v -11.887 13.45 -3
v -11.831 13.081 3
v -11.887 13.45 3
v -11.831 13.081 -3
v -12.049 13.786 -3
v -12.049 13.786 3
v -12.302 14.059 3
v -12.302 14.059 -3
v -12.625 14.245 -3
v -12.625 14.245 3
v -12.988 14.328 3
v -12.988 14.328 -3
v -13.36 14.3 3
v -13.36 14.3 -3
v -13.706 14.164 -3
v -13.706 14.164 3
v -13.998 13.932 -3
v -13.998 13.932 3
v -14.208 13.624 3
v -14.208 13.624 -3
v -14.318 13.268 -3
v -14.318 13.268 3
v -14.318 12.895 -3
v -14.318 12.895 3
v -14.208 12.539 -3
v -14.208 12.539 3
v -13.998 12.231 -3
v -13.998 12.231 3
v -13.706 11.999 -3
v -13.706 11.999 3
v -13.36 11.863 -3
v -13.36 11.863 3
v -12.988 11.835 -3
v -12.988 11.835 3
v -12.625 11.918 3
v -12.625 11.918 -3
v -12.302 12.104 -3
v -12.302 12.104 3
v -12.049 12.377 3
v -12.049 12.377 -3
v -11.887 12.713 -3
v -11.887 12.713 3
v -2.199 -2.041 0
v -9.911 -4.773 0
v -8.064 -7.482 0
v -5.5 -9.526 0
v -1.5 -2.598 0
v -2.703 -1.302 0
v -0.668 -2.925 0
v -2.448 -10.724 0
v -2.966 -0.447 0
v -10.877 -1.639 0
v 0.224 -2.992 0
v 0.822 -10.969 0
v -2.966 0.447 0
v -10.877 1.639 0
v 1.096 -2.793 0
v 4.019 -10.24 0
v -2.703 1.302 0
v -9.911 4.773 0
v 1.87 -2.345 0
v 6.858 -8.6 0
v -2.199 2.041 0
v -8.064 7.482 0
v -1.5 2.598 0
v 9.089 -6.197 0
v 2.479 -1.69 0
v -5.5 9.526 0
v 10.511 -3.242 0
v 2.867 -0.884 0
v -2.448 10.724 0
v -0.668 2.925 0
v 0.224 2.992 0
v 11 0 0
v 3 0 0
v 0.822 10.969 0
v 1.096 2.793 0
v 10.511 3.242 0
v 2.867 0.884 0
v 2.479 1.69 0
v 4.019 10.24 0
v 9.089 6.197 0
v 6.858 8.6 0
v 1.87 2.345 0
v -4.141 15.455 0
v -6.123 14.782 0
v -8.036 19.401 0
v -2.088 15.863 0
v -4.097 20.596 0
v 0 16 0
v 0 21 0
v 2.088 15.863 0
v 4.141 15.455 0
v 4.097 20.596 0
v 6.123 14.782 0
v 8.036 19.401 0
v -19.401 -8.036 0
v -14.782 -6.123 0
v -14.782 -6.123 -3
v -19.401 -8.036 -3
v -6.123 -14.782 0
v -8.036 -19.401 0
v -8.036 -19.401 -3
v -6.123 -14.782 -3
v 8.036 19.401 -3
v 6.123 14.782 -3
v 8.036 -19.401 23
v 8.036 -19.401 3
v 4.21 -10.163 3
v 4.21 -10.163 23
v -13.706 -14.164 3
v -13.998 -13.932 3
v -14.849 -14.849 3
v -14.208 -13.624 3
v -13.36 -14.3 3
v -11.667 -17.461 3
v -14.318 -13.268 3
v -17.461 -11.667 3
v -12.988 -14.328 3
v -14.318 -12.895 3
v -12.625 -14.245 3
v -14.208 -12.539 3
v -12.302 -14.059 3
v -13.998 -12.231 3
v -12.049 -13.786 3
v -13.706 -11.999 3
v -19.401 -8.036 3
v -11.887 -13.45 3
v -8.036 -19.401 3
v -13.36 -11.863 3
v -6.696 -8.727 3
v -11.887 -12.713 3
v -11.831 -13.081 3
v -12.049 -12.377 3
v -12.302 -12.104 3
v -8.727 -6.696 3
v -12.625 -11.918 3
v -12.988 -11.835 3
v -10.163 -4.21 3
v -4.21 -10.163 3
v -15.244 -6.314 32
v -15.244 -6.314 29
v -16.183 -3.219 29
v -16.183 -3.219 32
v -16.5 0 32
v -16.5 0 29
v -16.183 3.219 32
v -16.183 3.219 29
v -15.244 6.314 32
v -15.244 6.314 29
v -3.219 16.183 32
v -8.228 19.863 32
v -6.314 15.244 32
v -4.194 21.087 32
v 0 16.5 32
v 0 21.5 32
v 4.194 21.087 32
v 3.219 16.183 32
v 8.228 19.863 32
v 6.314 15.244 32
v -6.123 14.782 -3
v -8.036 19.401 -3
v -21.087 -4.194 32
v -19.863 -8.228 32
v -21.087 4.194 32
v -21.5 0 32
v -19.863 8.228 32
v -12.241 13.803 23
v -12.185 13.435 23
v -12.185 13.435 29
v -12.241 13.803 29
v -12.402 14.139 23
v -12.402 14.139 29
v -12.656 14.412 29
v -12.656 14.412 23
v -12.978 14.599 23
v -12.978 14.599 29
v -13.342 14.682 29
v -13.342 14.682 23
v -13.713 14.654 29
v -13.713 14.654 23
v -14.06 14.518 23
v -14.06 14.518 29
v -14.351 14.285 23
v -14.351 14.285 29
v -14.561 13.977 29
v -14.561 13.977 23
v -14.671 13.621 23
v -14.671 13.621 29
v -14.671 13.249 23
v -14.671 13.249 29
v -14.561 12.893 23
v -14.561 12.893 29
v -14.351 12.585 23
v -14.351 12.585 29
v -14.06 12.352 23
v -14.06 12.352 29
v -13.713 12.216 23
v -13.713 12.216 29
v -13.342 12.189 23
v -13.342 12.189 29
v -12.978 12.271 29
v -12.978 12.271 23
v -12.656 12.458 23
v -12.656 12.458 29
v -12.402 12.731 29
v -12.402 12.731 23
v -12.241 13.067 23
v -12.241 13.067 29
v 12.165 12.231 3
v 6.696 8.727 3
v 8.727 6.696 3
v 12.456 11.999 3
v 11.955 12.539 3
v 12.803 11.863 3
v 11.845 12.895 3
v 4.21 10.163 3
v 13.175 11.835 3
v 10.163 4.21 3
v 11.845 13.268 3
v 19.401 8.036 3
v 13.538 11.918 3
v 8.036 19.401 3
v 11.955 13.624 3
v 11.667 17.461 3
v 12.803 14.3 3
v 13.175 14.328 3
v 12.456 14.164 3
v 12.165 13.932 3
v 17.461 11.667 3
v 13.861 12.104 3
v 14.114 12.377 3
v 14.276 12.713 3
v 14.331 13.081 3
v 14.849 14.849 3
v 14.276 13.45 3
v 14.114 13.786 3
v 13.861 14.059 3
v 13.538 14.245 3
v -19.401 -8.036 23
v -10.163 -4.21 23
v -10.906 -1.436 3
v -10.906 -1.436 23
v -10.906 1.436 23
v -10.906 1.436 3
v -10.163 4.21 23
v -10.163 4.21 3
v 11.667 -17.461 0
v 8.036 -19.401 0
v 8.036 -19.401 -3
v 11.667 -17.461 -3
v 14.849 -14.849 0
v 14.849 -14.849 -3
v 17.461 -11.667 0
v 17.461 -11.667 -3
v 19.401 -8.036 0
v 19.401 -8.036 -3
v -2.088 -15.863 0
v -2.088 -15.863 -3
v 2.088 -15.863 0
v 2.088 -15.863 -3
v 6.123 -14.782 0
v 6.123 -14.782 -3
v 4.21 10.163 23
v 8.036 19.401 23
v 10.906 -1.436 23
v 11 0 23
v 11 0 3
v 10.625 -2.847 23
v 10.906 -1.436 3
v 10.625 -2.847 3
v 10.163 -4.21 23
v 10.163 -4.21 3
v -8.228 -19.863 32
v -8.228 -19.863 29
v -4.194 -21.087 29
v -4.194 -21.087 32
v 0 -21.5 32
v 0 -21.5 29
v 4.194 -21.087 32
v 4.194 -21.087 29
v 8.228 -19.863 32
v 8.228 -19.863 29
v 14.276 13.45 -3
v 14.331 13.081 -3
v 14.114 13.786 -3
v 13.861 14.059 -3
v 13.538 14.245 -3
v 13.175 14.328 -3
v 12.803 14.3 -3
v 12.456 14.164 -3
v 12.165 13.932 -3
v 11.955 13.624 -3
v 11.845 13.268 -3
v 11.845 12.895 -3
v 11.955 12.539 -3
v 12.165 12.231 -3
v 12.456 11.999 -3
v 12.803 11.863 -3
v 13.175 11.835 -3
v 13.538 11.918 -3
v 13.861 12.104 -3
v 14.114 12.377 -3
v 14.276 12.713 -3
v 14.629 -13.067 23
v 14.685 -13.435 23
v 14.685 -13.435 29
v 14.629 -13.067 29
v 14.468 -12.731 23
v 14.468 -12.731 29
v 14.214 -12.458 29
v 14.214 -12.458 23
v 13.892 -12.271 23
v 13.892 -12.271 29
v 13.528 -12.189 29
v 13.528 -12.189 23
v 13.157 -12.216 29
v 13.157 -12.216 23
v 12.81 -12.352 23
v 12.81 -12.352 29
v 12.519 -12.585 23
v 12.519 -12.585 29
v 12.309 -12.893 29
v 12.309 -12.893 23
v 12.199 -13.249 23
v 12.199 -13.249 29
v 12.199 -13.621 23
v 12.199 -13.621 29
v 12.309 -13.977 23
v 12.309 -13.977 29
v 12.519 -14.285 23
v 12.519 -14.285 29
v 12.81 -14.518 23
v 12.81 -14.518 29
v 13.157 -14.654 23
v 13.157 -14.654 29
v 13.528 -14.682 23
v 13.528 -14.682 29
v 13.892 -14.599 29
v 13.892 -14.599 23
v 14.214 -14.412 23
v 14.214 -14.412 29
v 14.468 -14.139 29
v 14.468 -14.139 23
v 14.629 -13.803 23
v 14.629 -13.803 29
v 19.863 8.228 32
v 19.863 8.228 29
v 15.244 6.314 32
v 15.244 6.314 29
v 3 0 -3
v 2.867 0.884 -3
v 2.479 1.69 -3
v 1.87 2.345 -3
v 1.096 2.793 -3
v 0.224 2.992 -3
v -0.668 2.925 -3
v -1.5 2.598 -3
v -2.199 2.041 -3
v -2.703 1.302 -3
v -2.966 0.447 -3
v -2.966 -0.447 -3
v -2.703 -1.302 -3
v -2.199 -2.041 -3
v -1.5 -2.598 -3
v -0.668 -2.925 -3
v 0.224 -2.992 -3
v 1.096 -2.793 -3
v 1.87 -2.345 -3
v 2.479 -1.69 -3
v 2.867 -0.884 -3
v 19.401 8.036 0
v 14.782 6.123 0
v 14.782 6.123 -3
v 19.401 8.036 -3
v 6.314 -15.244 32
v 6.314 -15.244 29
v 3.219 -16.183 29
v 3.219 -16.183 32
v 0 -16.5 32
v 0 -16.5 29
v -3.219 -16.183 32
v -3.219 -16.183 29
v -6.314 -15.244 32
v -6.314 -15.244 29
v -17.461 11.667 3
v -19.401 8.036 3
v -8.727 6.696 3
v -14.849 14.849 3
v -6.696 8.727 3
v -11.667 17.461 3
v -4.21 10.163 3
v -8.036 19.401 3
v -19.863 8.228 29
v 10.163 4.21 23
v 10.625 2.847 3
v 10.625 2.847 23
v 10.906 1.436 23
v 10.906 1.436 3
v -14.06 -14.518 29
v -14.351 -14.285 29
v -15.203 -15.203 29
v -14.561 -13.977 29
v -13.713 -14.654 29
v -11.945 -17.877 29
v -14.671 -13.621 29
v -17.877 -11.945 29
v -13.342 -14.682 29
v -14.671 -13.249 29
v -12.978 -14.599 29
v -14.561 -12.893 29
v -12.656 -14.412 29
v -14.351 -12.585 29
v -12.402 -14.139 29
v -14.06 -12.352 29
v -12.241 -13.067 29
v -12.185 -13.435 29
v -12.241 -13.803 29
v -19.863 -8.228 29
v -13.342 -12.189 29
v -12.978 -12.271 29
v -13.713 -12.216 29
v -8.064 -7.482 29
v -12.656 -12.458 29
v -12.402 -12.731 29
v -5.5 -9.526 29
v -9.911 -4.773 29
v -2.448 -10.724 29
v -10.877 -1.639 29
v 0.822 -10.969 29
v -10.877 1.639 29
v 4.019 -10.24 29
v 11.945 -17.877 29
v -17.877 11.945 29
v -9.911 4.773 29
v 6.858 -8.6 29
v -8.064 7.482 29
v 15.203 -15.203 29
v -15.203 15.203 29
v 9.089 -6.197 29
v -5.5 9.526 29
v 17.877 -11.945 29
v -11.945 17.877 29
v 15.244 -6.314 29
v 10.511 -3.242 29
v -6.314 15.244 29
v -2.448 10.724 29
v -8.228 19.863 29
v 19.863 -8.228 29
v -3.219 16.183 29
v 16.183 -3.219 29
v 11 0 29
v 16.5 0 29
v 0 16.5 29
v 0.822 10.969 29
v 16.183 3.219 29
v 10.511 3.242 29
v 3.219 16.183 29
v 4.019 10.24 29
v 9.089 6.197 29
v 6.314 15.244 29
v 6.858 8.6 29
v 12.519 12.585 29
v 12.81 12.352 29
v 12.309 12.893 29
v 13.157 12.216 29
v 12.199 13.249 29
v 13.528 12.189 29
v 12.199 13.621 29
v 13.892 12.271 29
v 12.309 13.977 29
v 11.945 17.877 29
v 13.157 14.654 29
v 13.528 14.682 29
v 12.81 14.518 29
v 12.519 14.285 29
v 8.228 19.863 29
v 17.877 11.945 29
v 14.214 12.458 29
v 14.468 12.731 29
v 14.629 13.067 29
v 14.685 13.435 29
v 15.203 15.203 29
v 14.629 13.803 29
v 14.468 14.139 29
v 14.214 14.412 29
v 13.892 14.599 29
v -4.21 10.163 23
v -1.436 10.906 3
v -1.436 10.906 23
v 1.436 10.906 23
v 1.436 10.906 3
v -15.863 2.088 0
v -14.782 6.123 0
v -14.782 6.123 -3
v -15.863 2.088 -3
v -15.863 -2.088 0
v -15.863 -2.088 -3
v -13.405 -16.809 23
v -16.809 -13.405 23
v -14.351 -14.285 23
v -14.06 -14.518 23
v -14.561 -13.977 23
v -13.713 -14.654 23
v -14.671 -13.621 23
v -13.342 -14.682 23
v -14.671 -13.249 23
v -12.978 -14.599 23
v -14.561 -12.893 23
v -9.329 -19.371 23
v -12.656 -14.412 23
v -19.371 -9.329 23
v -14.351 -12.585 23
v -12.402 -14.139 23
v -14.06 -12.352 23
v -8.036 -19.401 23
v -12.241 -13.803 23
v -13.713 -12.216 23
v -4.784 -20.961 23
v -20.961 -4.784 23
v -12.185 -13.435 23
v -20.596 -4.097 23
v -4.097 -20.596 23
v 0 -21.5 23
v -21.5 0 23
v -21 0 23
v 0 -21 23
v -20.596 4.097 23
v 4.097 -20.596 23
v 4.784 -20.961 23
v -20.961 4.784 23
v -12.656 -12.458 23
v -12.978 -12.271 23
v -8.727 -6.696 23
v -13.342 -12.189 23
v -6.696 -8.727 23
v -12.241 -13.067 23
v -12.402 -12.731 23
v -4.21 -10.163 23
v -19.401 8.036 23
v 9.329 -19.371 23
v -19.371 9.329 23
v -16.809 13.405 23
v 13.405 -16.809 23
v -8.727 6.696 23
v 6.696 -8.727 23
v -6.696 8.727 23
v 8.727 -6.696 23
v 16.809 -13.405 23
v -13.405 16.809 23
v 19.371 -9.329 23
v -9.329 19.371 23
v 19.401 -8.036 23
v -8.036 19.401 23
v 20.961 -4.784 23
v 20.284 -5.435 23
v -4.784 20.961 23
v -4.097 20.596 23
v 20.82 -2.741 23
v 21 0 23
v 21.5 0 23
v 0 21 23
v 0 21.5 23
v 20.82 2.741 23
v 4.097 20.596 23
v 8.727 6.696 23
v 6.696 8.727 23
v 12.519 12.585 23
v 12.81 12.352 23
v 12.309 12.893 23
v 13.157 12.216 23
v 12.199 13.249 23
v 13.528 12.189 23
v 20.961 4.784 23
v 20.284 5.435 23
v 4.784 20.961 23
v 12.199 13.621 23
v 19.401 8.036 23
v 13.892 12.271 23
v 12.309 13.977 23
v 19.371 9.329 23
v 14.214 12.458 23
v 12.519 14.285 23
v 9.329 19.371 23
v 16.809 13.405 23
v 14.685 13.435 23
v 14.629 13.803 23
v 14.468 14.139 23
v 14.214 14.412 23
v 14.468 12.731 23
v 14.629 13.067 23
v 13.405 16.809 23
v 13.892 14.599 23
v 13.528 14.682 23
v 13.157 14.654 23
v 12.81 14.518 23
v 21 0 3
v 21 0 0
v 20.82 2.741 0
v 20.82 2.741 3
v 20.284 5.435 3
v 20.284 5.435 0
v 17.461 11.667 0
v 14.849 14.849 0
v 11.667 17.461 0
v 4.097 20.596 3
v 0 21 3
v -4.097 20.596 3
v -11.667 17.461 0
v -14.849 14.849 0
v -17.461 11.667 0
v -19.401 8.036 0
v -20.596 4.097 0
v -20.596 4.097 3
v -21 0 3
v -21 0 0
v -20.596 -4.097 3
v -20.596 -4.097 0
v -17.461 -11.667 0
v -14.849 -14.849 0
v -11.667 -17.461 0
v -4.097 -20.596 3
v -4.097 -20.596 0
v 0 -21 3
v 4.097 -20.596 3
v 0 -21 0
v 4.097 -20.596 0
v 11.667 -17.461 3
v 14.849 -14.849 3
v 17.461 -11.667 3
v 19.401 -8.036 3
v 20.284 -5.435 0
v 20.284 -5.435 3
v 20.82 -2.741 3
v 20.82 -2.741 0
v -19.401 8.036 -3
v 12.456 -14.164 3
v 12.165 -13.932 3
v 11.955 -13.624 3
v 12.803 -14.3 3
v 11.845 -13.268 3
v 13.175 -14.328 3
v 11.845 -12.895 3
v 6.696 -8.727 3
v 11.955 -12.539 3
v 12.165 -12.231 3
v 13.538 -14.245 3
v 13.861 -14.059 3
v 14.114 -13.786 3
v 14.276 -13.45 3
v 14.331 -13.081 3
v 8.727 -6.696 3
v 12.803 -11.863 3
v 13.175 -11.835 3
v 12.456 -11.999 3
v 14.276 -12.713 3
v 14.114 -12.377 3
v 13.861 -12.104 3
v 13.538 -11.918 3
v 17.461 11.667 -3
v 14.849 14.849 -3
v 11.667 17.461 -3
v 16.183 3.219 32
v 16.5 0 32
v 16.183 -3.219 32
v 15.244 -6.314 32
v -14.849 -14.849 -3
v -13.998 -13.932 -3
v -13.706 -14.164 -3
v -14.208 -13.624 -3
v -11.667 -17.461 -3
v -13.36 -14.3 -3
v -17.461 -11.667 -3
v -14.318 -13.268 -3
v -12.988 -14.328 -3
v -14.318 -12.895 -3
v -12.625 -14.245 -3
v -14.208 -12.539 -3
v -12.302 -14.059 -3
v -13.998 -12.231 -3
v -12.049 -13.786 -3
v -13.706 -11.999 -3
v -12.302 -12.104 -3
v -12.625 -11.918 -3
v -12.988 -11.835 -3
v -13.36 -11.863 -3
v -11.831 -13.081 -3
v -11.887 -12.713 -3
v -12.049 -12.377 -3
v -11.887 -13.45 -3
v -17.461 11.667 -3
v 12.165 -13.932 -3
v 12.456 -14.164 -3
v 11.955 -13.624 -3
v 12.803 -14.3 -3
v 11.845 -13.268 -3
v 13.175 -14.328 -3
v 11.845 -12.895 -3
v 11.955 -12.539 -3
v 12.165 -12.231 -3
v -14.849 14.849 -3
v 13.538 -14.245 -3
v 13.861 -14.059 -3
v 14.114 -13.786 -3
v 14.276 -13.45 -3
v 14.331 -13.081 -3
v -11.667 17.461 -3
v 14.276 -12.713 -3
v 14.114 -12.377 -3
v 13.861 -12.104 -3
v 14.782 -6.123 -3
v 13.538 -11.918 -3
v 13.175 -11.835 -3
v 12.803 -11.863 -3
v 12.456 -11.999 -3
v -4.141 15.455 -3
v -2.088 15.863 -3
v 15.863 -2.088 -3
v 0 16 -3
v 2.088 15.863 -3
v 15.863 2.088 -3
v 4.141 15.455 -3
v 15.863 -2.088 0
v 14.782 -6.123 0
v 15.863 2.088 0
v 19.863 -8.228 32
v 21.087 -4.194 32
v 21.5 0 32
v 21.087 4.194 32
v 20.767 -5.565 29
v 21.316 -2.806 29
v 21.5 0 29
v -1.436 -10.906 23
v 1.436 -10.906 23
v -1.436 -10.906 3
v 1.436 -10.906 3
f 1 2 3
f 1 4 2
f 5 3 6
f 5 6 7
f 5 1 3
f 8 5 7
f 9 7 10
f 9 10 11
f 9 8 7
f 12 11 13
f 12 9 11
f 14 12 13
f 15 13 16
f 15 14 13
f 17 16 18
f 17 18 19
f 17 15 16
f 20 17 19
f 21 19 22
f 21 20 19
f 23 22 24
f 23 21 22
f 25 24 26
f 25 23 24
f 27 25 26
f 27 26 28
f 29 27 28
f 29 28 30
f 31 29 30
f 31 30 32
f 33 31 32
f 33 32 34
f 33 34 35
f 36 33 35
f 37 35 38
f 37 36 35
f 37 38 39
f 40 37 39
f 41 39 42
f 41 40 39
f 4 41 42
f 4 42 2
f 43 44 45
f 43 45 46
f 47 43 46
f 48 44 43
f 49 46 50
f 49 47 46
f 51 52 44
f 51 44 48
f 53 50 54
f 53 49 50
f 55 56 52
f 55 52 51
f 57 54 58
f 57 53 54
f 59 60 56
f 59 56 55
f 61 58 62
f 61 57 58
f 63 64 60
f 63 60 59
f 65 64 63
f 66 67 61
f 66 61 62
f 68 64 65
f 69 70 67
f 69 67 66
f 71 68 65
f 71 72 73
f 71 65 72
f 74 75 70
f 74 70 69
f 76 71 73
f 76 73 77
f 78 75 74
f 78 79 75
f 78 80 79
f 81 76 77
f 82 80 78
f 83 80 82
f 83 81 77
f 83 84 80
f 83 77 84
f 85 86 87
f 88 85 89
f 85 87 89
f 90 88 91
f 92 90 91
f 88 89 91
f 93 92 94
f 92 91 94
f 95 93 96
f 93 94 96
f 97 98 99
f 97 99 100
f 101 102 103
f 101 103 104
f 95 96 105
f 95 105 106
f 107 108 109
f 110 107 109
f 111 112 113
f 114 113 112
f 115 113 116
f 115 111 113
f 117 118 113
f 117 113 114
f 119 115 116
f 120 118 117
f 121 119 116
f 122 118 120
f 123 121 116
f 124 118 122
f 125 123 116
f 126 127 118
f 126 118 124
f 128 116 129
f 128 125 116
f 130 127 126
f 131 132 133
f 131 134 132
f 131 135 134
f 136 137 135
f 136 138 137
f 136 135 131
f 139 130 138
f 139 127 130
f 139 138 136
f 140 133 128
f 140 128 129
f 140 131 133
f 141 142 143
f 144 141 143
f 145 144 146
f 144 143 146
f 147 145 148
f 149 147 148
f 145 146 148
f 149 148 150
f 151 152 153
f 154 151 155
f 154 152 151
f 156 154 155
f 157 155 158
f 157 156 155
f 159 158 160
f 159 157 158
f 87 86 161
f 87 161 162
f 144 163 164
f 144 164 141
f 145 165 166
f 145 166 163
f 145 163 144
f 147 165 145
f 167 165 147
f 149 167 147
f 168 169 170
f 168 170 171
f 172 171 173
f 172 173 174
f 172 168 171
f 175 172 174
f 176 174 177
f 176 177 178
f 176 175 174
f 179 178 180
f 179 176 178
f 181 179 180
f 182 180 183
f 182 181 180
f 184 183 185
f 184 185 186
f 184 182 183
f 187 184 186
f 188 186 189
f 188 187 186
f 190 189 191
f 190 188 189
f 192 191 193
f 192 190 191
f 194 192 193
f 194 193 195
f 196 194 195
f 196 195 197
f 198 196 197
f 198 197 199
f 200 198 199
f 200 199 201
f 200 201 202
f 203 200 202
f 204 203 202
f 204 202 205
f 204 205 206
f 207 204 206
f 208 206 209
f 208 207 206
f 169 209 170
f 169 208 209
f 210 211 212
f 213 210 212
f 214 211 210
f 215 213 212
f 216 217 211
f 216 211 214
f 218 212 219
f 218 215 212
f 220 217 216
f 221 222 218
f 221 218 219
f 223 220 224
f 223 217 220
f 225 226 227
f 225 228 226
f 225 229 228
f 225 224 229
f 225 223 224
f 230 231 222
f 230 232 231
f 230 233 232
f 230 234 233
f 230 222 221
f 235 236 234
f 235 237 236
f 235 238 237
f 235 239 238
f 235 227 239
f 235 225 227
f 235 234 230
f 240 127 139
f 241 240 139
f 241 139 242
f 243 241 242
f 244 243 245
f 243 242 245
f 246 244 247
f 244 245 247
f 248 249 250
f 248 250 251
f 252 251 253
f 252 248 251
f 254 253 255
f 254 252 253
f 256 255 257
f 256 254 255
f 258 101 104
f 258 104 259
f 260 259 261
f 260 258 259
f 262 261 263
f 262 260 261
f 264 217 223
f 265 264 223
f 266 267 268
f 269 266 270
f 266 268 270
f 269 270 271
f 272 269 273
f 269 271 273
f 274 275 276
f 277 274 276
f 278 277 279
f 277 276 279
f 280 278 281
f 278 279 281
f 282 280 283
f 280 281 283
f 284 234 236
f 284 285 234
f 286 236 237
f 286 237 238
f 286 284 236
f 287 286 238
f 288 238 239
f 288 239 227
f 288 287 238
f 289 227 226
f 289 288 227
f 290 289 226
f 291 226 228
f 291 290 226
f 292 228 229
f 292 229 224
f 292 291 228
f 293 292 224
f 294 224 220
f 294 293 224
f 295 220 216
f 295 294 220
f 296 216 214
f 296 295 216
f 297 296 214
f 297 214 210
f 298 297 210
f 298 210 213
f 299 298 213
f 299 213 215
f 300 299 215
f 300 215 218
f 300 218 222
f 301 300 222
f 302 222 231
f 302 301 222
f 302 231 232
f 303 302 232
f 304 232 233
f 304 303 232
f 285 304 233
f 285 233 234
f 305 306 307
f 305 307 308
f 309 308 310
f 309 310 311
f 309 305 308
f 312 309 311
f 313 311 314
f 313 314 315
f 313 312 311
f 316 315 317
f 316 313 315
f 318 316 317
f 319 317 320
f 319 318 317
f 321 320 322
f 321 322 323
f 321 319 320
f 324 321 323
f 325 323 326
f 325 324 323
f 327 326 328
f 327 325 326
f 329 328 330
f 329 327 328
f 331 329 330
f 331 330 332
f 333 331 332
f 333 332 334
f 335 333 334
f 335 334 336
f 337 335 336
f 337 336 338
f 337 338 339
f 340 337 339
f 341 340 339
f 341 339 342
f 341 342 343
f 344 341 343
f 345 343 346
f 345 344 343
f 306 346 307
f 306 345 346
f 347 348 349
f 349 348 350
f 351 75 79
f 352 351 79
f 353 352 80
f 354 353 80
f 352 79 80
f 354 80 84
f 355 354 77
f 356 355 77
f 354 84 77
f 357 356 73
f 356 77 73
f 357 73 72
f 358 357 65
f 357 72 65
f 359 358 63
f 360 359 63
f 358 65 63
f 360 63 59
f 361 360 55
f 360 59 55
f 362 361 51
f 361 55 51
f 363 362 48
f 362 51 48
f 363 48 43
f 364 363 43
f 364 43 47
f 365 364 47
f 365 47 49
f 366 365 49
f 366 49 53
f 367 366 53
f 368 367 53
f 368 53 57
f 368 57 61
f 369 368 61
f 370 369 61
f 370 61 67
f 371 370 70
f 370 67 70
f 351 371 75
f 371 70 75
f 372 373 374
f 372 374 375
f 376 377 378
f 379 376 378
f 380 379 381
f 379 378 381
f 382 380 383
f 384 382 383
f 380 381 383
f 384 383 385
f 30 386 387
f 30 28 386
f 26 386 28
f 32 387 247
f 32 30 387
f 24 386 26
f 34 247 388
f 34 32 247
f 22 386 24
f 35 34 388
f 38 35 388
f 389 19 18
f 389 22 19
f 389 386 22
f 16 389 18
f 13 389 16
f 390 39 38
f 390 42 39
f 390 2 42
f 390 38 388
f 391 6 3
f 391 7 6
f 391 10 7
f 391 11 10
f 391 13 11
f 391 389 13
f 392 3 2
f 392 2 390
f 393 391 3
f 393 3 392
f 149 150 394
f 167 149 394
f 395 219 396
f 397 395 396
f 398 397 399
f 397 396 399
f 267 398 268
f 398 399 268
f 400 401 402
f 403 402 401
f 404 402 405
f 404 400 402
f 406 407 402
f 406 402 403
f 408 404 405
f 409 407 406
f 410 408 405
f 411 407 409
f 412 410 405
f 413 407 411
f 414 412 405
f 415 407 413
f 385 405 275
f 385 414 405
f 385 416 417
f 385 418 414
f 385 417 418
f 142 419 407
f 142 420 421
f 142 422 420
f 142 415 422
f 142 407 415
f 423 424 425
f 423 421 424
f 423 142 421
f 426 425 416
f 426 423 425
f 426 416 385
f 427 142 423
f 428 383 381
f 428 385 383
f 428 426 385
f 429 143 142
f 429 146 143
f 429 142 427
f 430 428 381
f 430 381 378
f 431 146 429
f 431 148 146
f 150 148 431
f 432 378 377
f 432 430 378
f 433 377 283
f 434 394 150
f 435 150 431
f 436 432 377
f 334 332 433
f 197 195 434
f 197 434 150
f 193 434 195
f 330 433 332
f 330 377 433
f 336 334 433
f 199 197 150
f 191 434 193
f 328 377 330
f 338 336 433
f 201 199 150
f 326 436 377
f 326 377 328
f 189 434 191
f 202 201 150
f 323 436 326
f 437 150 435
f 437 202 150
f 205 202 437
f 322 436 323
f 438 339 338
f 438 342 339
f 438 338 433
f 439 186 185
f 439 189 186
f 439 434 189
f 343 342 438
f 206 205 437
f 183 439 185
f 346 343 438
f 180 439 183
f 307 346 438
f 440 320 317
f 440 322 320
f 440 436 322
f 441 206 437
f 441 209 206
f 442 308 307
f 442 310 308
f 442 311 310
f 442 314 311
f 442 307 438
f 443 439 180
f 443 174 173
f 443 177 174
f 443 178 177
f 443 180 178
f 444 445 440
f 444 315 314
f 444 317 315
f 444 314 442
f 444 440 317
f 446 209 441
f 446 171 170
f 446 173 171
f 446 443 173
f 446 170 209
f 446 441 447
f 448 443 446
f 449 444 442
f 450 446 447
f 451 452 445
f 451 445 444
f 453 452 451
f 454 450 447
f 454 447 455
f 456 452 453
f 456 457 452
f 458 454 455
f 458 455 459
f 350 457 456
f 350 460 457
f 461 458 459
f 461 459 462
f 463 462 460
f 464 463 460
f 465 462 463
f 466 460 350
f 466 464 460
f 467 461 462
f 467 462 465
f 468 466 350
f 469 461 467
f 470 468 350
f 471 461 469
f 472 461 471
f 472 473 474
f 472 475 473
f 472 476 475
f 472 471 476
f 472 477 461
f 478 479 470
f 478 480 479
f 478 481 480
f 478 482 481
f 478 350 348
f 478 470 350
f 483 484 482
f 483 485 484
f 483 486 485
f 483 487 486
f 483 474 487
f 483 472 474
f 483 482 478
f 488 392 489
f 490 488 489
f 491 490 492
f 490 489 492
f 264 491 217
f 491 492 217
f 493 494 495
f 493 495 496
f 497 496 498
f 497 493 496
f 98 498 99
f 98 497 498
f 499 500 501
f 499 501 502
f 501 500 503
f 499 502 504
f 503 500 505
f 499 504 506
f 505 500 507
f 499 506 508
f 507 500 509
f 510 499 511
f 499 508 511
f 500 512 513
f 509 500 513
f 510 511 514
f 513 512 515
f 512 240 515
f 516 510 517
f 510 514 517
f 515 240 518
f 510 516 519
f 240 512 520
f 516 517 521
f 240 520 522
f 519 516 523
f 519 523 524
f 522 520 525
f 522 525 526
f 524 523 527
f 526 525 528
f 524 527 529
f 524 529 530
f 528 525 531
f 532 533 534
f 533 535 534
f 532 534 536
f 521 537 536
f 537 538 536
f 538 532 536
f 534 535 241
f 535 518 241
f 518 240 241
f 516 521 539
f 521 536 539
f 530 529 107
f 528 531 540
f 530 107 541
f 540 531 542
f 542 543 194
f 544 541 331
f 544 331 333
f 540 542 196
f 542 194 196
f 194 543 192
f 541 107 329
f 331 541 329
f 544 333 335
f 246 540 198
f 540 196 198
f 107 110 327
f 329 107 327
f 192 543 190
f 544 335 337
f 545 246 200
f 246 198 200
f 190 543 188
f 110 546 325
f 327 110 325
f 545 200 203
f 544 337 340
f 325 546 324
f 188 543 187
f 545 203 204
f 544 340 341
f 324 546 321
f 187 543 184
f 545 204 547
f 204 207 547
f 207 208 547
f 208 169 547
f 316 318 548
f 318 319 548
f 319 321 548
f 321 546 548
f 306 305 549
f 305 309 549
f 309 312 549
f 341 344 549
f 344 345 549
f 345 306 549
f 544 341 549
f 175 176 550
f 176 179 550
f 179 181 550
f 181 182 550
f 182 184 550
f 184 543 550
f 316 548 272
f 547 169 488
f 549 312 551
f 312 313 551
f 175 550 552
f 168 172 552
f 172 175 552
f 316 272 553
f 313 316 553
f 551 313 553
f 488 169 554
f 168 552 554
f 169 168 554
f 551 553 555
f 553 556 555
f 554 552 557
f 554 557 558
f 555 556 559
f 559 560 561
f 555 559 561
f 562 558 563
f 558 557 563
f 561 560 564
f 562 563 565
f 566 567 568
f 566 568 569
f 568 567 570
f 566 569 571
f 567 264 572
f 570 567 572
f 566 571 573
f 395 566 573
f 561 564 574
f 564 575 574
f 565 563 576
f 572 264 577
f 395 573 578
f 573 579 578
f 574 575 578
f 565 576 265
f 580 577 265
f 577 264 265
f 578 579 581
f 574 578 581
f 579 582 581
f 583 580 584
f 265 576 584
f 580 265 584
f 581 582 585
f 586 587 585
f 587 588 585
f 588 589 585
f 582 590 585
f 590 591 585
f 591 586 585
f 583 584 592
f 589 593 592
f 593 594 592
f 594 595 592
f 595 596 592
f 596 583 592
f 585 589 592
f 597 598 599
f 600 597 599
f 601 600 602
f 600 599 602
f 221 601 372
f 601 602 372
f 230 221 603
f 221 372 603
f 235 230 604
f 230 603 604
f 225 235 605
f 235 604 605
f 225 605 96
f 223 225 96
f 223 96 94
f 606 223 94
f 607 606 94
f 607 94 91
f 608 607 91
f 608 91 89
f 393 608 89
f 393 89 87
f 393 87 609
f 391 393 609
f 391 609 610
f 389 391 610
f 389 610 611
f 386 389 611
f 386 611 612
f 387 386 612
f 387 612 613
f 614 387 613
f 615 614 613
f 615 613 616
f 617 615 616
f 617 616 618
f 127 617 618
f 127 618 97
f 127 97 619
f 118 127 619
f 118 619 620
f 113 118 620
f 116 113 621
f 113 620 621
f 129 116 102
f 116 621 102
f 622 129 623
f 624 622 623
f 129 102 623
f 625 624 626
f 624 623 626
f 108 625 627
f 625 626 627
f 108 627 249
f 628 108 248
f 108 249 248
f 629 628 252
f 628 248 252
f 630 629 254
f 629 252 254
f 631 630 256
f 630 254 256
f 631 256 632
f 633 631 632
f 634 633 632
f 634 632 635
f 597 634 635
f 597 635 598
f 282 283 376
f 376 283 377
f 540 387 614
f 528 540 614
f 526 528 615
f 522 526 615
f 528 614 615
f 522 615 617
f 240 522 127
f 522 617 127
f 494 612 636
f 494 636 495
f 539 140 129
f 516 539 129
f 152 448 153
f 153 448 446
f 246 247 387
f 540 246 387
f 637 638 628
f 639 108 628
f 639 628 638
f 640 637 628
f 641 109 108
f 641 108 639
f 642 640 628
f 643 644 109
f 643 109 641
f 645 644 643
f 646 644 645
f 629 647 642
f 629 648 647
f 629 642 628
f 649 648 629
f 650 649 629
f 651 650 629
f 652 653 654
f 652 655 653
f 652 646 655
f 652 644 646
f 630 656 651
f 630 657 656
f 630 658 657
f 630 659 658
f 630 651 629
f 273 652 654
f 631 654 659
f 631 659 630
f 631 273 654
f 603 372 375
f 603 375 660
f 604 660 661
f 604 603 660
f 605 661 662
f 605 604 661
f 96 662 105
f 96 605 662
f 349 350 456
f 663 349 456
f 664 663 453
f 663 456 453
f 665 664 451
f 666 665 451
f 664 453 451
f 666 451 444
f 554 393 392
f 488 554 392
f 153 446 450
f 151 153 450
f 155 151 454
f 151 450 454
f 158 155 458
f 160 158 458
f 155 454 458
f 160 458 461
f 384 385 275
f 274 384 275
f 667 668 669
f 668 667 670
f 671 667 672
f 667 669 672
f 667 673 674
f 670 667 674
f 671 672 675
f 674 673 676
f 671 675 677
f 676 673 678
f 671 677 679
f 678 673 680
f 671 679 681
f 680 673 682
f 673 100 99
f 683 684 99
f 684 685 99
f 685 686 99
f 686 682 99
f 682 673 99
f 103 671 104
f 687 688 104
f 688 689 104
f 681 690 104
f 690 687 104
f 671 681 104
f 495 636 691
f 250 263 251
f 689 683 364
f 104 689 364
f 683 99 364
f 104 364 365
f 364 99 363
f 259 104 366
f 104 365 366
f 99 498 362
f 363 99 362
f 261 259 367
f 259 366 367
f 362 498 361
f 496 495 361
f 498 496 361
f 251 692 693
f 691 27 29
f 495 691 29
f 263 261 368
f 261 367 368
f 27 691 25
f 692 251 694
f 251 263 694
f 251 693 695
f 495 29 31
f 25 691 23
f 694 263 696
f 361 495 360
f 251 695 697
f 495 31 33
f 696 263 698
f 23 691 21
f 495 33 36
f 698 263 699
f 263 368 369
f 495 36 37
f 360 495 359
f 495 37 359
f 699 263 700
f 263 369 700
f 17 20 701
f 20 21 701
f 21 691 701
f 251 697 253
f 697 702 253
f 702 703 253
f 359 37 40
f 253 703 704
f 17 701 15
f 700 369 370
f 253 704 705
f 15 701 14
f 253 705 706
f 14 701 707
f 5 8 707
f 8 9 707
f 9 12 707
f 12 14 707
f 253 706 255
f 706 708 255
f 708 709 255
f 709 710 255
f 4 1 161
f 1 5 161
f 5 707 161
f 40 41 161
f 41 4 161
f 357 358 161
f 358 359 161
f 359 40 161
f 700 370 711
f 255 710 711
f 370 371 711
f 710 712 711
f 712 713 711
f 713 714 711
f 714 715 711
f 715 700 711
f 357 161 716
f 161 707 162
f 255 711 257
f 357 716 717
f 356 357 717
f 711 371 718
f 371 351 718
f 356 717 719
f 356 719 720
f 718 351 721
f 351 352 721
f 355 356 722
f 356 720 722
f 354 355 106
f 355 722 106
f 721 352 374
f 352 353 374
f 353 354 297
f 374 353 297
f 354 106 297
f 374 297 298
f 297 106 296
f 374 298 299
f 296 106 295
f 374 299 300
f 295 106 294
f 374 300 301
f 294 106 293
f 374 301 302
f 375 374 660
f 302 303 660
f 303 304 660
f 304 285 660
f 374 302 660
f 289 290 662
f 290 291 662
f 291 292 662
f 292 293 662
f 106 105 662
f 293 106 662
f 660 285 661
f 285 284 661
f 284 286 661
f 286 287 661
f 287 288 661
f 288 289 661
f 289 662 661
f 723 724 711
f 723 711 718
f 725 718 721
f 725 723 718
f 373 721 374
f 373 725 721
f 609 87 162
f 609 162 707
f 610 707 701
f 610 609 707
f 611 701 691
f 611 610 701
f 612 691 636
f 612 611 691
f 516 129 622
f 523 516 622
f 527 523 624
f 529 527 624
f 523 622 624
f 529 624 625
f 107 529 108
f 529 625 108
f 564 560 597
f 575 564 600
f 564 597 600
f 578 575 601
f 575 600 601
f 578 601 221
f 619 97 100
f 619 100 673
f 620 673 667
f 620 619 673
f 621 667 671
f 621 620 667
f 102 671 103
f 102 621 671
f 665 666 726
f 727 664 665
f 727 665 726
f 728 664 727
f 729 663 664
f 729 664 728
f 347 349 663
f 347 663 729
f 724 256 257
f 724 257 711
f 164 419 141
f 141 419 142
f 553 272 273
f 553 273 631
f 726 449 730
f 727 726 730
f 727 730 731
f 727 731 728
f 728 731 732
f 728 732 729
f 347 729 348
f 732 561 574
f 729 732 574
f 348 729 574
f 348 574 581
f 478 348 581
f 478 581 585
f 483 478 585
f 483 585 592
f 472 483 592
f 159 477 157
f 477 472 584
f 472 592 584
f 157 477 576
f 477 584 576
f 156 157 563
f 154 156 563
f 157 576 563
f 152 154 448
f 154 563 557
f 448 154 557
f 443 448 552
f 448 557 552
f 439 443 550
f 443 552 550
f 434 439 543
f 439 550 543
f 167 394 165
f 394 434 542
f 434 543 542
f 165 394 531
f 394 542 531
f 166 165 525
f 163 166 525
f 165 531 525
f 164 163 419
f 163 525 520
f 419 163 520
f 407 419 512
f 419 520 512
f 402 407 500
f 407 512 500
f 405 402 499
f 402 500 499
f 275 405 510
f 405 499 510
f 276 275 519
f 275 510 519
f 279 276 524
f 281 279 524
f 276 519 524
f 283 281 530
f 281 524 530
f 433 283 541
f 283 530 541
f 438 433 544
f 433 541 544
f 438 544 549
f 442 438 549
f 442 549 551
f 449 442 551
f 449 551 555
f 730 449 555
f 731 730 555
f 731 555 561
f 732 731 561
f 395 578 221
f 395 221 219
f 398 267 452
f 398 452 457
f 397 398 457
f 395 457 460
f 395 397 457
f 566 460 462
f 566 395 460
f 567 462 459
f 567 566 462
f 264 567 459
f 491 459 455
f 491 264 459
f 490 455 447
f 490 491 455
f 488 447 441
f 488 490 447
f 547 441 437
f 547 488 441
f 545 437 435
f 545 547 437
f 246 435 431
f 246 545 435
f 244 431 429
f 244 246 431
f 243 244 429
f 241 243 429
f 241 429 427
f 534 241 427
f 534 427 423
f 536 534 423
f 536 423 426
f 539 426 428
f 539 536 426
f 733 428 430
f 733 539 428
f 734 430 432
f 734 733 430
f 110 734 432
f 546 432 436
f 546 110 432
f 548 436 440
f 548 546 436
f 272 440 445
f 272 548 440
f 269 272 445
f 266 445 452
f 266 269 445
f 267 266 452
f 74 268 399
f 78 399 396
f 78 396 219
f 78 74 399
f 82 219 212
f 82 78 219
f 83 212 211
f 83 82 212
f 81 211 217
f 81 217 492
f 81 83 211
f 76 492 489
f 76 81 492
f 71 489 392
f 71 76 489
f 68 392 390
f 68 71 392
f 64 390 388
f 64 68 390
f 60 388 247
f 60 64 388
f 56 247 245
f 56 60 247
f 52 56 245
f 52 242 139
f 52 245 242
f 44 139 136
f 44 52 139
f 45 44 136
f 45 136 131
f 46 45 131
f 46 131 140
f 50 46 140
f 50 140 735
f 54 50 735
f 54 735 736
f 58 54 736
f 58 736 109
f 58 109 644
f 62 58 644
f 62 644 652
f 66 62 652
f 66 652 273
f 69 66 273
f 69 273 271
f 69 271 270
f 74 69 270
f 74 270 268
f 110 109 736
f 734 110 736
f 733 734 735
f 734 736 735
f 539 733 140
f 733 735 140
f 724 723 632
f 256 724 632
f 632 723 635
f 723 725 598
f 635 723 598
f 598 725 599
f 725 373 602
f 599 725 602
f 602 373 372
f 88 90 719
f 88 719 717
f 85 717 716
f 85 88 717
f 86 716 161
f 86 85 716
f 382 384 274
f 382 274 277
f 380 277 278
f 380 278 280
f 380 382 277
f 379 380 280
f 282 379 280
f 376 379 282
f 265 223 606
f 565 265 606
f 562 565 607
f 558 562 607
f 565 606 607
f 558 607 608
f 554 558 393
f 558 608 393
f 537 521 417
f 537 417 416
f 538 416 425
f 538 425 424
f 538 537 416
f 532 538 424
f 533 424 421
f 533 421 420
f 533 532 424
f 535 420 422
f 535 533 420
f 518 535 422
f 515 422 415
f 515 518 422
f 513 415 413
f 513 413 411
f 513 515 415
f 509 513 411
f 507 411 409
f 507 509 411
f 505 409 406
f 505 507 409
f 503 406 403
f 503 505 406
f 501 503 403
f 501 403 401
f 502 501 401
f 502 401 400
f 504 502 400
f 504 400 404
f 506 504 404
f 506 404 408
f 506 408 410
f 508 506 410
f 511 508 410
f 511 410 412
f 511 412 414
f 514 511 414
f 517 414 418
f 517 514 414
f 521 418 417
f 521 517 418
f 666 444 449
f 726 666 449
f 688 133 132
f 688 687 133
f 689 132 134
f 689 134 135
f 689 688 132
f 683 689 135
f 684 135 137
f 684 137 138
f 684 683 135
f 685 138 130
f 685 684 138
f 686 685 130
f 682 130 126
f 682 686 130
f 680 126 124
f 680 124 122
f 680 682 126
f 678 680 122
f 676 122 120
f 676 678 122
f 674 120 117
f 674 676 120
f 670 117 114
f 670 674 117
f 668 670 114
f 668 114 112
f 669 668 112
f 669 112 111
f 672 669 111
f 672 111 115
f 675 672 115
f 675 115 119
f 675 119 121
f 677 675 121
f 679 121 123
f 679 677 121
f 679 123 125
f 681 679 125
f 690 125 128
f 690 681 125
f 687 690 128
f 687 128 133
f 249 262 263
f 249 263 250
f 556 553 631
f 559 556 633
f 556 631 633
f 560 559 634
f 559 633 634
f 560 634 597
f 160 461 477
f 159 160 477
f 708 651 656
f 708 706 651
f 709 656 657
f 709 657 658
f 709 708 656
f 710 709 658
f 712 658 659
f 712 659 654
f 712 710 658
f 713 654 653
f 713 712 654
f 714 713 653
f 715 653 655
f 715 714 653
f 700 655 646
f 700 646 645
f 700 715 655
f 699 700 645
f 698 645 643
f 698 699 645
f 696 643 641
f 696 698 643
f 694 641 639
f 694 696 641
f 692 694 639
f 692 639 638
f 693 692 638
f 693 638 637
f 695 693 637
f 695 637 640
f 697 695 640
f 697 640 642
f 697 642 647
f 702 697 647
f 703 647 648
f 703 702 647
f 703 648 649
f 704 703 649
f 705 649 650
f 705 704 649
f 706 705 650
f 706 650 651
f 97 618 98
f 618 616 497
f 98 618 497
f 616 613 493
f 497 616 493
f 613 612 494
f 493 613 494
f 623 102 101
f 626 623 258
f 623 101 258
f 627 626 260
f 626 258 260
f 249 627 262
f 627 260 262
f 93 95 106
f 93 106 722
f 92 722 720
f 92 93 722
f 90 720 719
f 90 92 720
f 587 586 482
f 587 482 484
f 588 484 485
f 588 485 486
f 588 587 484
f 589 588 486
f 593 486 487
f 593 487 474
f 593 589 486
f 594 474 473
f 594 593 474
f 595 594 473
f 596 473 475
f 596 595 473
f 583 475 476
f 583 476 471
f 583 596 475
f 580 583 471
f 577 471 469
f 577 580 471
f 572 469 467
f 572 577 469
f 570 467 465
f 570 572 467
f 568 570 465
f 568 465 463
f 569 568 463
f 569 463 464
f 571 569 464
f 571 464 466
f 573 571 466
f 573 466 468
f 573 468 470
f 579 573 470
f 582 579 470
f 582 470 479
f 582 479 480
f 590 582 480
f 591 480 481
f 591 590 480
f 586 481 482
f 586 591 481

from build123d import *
from build123d.topology import SkipClean

# Parameters (mm, degrees)
SKETCH1_R           = 21
SKETCH1_R_2         = 1.25
SKETCH1_R_3         = 11
BOSS_EXTRUDE1_DEPTH = 3
BOSS_EXTRUDE2_START = -3
SKETCH1_3_R         = 3
SKETCH1_3_R_2       = 1.25
BOSS_EXTRUDE2_DEPTH = 3
BOSS_EXTRUDE3_DEPTH = 20
SKETCH5_R           = 21.5
SKETCH5_R_2         = 11
SKETCH5_R_3         = 1.25
BOSS_EXTRUDE4_DEPTH = 6
BOSS_EXTRUDE5_DEPTH = 3


with BuildPart() as part:
    # Sketch1 → Boss-Extrude1 (new body)
    with BuildSketch(Plane.XY):
        Circle(SKETCH1_R)
        with Locations((-13.081475452, -13.081475452)):
            Circle(SKETCH1_R_2, mode=Mode.SUBTRACT)
        with Locations((13.081475452, -13.081475452)):
            Circle(SKETCH1_R_2, mode=Mode.SUBTRACT)
        with Locations((-13.081475452, 13.081475452)):
            Circle(SKETCH1_R_2, mode=Mode.SUBTRACT)
        Circle(SKETCH1_R_3, mode=Mode.SUBTRACT)
        with Locations((13.081475452, 13.081475452)):
            Circle(SKETCH1_R_2, mode=Mode.SUBTRACT)
    extrude(amount=BOSS_EXTRUDE1_DEPTH)

    # Sketch1<3> → Boss-Extrude2 (add)
    with BuildSketch(Plane.XY.offset(BOSS_EXTRUDE2_START)):
        with BuildLine():
            ThreePointArc((0, 16), (-3.121445152, 15.692564486), (-6.122934918, 14.78207252))
            Line((-6.122934918, 14.78207252), (-8.03635208, 19.401470183))
            ThreePointArc((-8.03635208, 19.401470183), (-14.849242405, 14.849242405), (-19.401470183, 8.03635208))
            Line((-19.401470183, 8.03635208), (-14.78207252, 6.122934918))
            ThreePointArc((-14.78207252, 6.122934918), (-16, 0), (-14.78207252, -6.122934918))
            Line((-14.78207252, -6.122934918), (-19.401470183, -8.03635208))
            ThreePointArc((-19.401470183, -8.03635208), (-14.849242405, -14.849242405), (-8.03635208, -19.401470183))
            Line((-8.03635208, -19.401470183), (-6.122934918, -14.78207252))
            ThreePointArc((-6.122934918, -14.78207252), (0, -16), (6.122934918, -14.78207252))
            Line((6.122934918, -14.78207252), (8.03635208, -19.401470183))
            ThreePointArc((8.03635208, -19.401470183), (14.849242405, -14.849242405), (19.401470183, -8.03635208))
            Line((19.401470183, -8.03635208), (14.78207252, -6.122934918))
            ThreePointArc((14.78207252, -6.122934918), (16, 0), (14.78207252, 6.122934918))
            Line((14.78207252, 6.122934918), (19.401470183, 8.03635208))
            ThreePointArc((19.401470183, 8.03635208), (14.849242405, 14.849242405), (8.03635208, 19.401470183))
            Line((8.03635208, 19.401470183), (6.122934918, 14.78207252))
            ThreePointArc((6.122934918, 14.78207252), (3.121445152, 15.692564486), (0, 16))
        make_face()
        Circle(SKETCH1_3_R, mode=Mode.SUBTRACT)
        with Locations((-13.081475452, -13.081475452)):
            Circle(SKETCH1_3_R_2, mode=Mode.SUBTRACT)
        with Locations((13.081475452, -13.081475452)):
            Circle(SKETCH1_3_R_2, mode=Mode.SUBTRACT)
        with Locations((-13.081475452, 13.081475452)):
            Circle(SKETCH1_3_R_2, mode=Mode.SUBTRACT)
        with Locations((13.081475452, 13.081475452)):
            Circle(SKETCH1_3_R_2, mode=Mode.SUBTRACT)
    extrude(amount=BOSS_EXTRUDE2_DEPTH)

    # Sketch2 → Boss-Extrude3 (add)
    with SkipClean():  # the faces are left unmerged after this step: merging them gives an invalid solid
        with BuildSketch(Plane.XY.offset(3)):
            with BuildLine():
                Line((-10.162674858, 4.209517756), (-19.401470183, 8.03635208))
                ThreePointArc((-19.401470183, 8.03635208), (-21, 0), (-19.401470183, -8.03635208))
                Line((-19.401470183, -8.03635208), (-10.162674858, -4.209517756))
                ThreePointArc((-10.162674858, -4.209517756), (-11, 0), (-10.162674858, 4.209517756))
            make_face()
            with BuildLine():
                ThreePointArc((8.03635208, 19.401470183), (0, 21), (-8.03635208, 19.401470183))
                Line((-8.03635208, 19.401470183), (-4.209517756, 10.162674858))
                ThreePointArc((-4.209517756, 10.162674858), (0, 11), (4.209517756, 10.162674858))
                Line((4.209517756, 10.162674858), (8.03635208, 19.401470183))
            make_face()
            with BuildLine():
                Line((-4.209517756, -10.162674858), (-8.03635208, -19.401470183))
                ThreePointArc((-8.03635208, -19.401470183), (0, -21), (8.03635208, -19.401470183))
                Line((8.03635208, -19.401470183), (4.209517756, -10.162674858))
                ThreePointArc((4.209517756, -10.162674858), (0, -11), (-4.209517756, -10.162674858))
            make_face()
            with BuildLine():
                ThreePointArc((19.401470183, -8.03635208), (21, 0), (19.401470183, 8.03635208))
                Line((19.401470183, 8.03635208), (10.162674858, 4.209517756))
                ThreePointArc((10.162674858, 4.209517756), (11, 0), (10.162674858, -4.209517756))
                Line((10.162674858, -4.209517756), (19.401470183, -8.03635208))
            make_face()
        extrude(amount=BOSS_EXTRUDE3_DEPTH)

    # Sketch5 → Boss-Extrude4 (add)
    with SkipClean():  # the faces are left unmerged after this step: merging them gives an invalid solid
        with BuildSketch(Plane.XY.offset(23)):
            Circle(SKETCH5_R)
            Circle(SKETCH5_R_2, mode=Mode.SUBTRACT)
            with Locations((-13.435028843, 13.435028843)):
                Circle(SKETCH5_R_3, mode=Mode.SUBTRACT)
            with Locations((13.435028843, 13.435028843)):
                Circle(SKETCH5_R_3, mode=Mode.SUBTRACT)
            with Locations((13.435028843, -13.435028843)):
                Circle(SKETCH5_R_3, mode=Mode.SUBTRACT)
            with Locations((-13.435028843, -13.435028843)):
                Circle(SKETCH5_R_3, mode=Mode.SUBTRACT)
        extrude(amount=BOSS_EXTRUDE4_DEPTH)

    # Sketch6 → Boss-Extrude5 (add)
    with SkipClean():  # the faces are left unmerged after this step: merging them gives an invalid solid
        with BuildSketch(Plane.XY.offset(29)):
            with BuildLine():
                ThreePointArc((-15.244012286, -6.314276634), (-16.5, 0), (-15.244012286, 6.314276634))
                Line((-15.244012286, 6.314276634), (-19.863409949, 8.227693796))
                ThreePointArc((-19.863409949, 8.227693796), (-21.5, 0), (-19.863409949, -8.227693796))
                Line((-19.863409949, -8.227693796), (-15.244012286, -6.314276634))
            make_face()
            with BuildLine():
                Line((-8.227693796, 19.863409949), (-6.314276634, 15.244012286))
                ThreePointArc((-6.314276634, 15.244012286), (0, 16.5), (6.314276634, 15.244012286))
                Line((6.314276634, 15.244012286), (8.227693796, 19.863409949))
                ThreePointArc((8.227693796, 19.863409949), (0, 21.5), (-8.227693796, 19.863409949))
            make_face()
            with BuildLine():
                ThreePointArc((6.314276634, -15.244012286), (0, -16.5), (-6.314276634, -15.244012286))
                Line((-6.314276634, -15.244012286), (-8.227693796, -19.863409949))
                ThreePointArc((-8.227693796, -19.863409949), (0, -21.5), (8.227693796, -19.863409949))
                Line((8.227693796, -19.863409949), (6.314276634, -15.244012286))
            make_face()
            with BuildLine():
                Line((19.863409949, 8.227693796), (15.244012286, 6.314276634))
                ThreePointArc((15.244012286, 6.314276634), (16.5, 0), (15.244012286, -6.314276634))
                Line((15.244012286, -6.314276634), (19.863409949, -8.227693796))
                ThreePointArc((19.863409949, -8.227693796), (21.5, 0), (19.863409949, 8.227693796))
            make_face()
        extrude(amount=BOSS_EXTRUDE5_DEPTH)


solid = part.part
